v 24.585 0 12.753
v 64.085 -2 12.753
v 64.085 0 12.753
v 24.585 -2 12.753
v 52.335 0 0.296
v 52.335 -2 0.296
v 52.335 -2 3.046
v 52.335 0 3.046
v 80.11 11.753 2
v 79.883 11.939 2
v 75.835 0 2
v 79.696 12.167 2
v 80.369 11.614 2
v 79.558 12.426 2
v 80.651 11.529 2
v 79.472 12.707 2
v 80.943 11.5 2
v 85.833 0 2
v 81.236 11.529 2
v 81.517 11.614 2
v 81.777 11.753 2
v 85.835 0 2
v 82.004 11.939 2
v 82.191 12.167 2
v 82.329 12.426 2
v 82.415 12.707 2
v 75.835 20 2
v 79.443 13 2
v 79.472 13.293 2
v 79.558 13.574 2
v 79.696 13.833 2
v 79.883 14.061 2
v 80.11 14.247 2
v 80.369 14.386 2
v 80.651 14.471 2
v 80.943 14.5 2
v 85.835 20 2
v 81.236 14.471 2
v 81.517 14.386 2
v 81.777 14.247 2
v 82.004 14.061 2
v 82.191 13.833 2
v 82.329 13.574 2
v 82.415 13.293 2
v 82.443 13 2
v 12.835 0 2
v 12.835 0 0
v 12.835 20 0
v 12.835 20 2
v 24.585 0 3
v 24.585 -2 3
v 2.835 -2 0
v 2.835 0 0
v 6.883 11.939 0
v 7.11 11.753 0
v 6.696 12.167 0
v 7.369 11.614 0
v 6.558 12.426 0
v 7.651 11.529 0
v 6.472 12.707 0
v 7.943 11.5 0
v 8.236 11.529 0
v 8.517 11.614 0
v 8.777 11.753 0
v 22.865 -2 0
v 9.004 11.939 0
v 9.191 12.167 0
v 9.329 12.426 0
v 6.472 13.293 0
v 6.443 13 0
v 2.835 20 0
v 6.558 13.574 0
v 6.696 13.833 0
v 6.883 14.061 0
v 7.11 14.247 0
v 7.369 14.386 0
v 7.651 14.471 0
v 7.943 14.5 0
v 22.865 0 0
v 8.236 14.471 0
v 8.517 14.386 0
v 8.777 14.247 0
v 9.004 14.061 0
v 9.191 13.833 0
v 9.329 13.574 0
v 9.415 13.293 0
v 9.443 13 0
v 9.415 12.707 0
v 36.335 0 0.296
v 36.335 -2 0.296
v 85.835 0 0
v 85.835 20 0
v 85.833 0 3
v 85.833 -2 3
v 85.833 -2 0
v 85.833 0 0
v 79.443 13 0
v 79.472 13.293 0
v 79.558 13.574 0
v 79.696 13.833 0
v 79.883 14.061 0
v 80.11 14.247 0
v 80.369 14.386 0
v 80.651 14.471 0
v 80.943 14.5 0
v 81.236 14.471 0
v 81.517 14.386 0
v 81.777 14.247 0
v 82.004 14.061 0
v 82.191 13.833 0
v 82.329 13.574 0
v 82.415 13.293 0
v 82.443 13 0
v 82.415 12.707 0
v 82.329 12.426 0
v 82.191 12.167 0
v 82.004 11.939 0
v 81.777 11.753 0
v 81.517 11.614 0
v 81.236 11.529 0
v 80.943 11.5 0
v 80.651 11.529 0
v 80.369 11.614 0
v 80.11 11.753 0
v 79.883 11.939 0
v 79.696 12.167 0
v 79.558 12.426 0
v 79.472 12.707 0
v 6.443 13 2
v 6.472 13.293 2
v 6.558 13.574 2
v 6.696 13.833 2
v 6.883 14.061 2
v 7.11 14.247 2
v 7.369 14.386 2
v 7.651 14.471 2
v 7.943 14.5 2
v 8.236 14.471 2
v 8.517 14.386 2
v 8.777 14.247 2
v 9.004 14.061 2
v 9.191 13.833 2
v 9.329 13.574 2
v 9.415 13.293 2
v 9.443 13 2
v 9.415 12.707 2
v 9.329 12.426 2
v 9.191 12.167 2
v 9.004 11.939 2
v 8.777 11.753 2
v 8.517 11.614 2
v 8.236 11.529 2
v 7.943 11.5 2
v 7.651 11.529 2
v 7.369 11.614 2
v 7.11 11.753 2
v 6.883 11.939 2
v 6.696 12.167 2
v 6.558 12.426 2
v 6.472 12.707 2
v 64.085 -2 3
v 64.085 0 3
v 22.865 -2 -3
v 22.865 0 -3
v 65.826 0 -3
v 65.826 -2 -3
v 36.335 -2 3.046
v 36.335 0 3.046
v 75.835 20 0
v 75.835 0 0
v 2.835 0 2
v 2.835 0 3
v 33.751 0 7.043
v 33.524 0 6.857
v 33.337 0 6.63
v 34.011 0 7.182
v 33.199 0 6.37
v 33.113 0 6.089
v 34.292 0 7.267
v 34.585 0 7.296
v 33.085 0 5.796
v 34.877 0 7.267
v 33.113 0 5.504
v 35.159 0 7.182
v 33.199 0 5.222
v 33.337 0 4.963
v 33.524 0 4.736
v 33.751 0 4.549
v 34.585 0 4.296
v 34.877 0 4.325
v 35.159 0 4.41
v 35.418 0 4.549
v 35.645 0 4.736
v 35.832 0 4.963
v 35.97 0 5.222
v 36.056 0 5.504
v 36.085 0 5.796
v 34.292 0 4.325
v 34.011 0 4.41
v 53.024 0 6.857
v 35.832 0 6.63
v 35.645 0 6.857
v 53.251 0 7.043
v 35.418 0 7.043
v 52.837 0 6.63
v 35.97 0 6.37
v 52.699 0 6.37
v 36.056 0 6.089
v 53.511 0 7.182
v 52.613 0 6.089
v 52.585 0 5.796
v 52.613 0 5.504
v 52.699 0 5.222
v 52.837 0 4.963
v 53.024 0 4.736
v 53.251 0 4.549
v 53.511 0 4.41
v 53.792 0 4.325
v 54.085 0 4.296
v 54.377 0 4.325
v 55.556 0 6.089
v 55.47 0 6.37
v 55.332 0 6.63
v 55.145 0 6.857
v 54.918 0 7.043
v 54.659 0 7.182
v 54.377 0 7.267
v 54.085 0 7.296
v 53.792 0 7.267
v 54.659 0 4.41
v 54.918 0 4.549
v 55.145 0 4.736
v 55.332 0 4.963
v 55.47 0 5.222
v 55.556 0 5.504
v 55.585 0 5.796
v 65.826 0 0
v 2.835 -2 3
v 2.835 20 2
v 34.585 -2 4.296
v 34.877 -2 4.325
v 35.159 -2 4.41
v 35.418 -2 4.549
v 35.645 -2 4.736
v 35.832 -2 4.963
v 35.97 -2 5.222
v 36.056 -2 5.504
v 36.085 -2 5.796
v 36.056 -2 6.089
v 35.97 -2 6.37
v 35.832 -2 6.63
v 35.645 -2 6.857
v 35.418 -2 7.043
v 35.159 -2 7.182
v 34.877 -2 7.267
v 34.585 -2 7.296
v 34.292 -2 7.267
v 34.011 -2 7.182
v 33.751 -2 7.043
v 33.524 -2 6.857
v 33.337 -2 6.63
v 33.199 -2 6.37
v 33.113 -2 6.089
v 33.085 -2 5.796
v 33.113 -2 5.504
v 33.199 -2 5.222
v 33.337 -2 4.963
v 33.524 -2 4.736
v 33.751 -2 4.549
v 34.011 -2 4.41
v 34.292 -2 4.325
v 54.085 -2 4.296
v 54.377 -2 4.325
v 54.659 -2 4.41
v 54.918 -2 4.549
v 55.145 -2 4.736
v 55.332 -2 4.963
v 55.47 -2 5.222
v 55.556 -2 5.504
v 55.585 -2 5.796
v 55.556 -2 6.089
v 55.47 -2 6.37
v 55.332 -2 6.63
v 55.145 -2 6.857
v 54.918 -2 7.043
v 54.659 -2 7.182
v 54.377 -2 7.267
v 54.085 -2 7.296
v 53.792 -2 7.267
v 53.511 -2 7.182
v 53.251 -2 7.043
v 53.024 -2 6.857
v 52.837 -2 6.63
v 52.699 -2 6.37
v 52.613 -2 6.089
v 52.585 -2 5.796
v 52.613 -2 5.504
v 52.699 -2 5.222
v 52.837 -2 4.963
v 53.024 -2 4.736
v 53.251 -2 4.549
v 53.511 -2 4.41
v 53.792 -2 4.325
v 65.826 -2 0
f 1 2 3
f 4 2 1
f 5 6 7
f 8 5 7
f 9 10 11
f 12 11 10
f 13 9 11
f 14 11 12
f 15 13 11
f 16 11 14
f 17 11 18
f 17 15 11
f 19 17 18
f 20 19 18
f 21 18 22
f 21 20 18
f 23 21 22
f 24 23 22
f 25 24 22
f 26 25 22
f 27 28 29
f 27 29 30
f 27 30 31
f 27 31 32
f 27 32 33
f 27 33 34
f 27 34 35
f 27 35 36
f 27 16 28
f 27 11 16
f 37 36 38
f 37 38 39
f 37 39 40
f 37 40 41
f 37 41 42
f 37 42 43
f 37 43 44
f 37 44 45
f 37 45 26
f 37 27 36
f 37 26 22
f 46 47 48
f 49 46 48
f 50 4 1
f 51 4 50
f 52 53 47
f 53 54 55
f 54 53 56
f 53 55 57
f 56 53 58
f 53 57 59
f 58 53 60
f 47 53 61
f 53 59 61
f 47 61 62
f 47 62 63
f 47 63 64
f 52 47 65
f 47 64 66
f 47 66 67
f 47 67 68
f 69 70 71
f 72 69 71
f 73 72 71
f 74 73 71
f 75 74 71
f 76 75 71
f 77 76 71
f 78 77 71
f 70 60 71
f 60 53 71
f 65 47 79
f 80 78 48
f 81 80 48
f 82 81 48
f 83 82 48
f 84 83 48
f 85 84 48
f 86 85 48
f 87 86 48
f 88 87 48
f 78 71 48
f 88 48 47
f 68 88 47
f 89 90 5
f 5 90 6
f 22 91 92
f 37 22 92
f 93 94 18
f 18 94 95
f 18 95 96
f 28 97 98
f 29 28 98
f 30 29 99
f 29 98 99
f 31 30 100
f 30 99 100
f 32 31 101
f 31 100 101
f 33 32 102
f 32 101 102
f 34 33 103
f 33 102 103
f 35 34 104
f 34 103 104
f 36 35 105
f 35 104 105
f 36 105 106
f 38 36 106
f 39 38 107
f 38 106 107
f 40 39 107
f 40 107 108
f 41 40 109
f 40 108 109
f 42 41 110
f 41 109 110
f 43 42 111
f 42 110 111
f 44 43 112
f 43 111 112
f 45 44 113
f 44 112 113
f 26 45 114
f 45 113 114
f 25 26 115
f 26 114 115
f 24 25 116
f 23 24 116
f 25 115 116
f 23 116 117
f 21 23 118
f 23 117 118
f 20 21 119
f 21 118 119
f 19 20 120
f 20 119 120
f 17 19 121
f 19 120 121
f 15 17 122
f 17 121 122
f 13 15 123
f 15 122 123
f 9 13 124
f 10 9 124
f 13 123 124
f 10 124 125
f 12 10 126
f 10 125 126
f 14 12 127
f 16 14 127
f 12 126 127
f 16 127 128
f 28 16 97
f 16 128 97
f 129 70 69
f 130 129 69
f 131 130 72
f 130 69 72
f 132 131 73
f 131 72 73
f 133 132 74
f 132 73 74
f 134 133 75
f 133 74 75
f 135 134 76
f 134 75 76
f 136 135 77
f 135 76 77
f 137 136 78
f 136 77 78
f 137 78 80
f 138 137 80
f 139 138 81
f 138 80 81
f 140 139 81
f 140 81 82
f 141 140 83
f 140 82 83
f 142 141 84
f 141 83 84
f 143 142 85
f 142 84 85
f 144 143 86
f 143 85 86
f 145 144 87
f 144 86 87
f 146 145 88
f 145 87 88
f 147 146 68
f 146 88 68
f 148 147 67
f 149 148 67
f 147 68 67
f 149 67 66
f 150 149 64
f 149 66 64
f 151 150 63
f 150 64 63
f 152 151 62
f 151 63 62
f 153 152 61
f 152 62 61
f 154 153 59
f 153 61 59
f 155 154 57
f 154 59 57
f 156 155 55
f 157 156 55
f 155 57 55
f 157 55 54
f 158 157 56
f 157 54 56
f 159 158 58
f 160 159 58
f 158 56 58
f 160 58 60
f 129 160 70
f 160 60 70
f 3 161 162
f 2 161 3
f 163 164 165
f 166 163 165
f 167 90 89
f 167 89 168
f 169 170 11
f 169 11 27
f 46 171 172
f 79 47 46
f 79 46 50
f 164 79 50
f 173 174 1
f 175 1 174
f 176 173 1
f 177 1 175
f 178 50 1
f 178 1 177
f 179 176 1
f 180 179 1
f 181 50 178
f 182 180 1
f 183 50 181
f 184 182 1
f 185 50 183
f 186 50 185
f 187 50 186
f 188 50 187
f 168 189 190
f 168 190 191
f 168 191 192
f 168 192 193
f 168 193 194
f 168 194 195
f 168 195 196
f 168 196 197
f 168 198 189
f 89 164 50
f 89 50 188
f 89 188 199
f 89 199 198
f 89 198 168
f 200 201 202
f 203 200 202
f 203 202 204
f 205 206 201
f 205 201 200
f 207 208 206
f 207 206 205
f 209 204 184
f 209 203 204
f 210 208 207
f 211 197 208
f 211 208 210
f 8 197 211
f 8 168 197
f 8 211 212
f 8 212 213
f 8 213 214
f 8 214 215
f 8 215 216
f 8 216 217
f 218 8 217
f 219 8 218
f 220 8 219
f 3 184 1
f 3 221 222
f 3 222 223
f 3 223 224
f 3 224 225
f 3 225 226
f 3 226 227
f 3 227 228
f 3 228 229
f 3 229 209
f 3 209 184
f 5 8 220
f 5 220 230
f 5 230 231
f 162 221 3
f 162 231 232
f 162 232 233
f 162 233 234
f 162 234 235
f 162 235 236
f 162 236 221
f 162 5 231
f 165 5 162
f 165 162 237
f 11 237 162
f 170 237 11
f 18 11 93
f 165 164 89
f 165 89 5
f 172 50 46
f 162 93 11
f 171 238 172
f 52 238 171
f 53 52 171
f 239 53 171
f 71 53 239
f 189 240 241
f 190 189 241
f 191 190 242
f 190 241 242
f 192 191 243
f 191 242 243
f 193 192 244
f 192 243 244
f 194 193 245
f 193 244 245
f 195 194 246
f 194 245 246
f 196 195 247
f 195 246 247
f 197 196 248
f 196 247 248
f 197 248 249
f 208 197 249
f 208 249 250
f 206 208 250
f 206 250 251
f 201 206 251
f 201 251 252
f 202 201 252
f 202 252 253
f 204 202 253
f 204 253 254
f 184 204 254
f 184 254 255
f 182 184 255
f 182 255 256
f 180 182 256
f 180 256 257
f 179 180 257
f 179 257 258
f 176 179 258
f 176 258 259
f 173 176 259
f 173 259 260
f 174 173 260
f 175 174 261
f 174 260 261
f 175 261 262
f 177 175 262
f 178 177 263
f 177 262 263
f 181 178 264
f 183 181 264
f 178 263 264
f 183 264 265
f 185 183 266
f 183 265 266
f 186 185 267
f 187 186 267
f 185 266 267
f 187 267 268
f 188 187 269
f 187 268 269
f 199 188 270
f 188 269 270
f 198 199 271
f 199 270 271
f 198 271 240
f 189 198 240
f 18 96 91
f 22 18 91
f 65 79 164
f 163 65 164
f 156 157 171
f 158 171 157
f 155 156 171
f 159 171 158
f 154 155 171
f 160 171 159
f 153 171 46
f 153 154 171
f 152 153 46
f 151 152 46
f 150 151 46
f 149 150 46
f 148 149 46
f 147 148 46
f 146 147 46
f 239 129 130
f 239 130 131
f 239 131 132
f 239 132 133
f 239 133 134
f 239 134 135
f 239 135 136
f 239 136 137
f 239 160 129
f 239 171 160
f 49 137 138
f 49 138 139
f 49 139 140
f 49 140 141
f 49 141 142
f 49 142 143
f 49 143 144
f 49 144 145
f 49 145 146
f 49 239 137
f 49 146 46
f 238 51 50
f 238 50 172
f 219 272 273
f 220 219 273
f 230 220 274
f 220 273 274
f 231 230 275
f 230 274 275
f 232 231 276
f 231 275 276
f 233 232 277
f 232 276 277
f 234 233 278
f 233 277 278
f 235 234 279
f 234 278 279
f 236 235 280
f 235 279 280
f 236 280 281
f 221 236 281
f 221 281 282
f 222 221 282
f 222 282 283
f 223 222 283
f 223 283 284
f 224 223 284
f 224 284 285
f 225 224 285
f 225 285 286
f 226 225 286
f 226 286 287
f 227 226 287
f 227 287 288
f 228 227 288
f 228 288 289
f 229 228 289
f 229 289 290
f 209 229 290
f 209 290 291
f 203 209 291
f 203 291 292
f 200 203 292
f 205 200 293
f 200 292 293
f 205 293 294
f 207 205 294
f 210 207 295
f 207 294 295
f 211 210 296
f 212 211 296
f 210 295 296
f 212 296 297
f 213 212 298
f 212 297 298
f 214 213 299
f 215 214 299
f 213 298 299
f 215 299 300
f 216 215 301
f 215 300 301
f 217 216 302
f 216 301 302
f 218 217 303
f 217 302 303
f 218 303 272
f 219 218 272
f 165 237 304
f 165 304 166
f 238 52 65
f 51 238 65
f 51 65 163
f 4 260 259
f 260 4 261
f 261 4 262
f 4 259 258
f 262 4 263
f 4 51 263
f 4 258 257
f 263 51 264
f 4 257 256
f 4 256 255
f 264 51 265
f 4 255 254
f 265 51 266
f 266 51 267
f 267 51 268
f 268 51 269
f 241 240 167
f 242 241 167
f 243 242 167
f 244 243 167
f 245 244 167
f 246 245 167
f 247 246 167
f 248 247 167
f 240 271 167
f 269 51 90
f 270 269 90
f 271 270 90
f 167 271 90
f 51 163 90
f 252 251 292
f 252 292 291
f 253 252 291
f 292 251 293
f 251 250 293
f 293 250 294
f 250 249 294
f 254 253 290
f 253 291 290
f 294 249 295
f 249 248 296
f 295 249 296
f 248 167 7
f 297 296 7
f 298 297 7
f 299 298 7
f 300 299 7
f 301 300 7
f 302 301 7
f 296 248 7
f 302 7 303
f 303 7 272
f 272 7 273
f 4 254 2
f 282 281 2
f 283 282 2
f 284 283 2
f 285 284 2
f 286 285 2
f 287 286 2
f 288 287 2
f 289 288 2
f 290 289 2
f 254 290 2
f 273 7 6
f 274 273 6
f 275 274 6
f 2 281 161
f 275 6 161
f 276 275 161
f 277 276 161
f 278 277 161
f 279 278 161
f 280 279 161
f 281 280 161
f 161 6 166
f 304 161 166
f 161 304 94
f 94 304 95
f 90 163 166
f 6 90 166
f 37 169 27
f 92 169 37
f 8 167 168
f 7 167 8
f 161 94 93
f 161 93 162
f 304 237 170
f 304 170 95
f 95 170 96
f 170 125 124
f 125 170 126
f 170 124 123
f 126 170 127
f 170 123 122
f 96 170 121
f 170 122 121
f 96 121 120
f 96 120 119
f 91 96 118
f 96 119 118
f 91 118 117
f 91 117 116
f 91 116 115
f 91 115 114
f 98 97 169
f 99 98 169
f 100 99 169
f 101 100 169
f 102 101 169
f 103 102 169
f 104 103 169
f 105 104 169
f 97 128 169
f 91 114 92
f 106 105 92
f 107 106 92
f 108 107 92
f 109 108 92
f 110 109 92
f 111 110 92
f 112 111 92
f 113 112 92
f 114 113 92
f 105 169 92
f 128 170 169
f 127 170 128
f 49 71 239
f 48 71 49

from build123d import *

# Parameters (mm, degrees)
SKETCH2_W                = 10
SKETCH2_H                = 20
BOSS_EXTRUDE1_DEPTH      = 2
BOSS_EXTRUDE1_2_DEPTH    = 2
SKETCH6_R                = 1.5
CUT_EXTRUDE1_DEPTH       = 2
BOSS_EXTRUDE2_DEPTH      = 15
BOSS_EXTRUDE2_DEPTH_BACK = 5
SKETCH7_W                = 82.998753655
SKETCH7_H                = 2
SKETCH8_R                = 1.5
SKETCH8_W                = 16
SKETCH8_H                = 2.75
CUT_EXTRUDE2_DEPTH       = 15
SKETCH9_W                = 20.030400643
SKETCH9_H                = 3
SKETCH9_W_2              = 20.007179251
CUT_EXTRUDE3_DEPTH       = 15


with BuildPart() as part:
    # Sketch2 → Boss-Extrude1 (new body)
    with BuildSketch(Plane.XY):
        with Locations((7.834645669, 10)):
            Rectangle(SKETCH2_W, SKETCH2_H)
    extrude(amount=BOSS_EXTRUDE1_DEPTH)


with BuildPart() as body_2:
    # Sketch2 → Boss-Extrude1 2 (new body)
    with BuildSketch(Plane.XY):
        with Locations((80.834645669, 10)):
            Rectangle(SKETCH2_W, SKETCH2_H)
    extrude(amount=BOSS_EXTRUDE1_2_DEPTH)


with BuildPart() as cut_extrude1_tool:
    # Sketch6 → Cut-Extrude1 (new body)
    with BuildSketch(Plane(origin=(0, 0, 0), x_dir=(-1, 0, 0), z_dir=(0, 0, -1))):
        with Locations((-80.943458849, 13)):
            Circle(SKETCH6_R)
        with Locations((-7.943458849, 13)):
            Circle(SKETCH6_R)
    extrude(amount=-CUT_EXTRUDE1_DEPTH)


with BuildPart() as part_1:
    add(part.part)

    # Cut-Extrude1: cut by cut_extrude1_tool
    add(cut_extrude1_tool.part, mode=Mode.SUBTRACT)



with BuildPart() as body_2_1:
    add(body_2.part)

    # Cut-Extrude1: cut by cut_extrude1_tool
    add(cut_extrude1_tool.part, mode=Mode.SUBTRACT)


with BuildPart() as part_2:
    add(part_1.part)

    add(body_2_1.part)  # Boss-Extrude2 merges body 2
    # Sketch7 → Boss-Extrude2 (add, two sides: drawn at the far end of the back side and taken through both)
    with BuildSketch(Plane.XY.offset(2).offset(-BOSS_EXTRUDE2_DEPTH_BACK)):
        with Locations((44.334022496, -1)):
            Rectangle(SKETCH7_W, SKETCH7_H)
    extrude(amount=BOSS_EXTRUDE2_DEPTH + BOSS_EXTRUDE2_DEPTH_BACK)

    # Sketch8 → Cut-Extrude2 (cut)
    with BuildSketch(Plane.XZ.offset(2)):
        with Locations(Location((54.084645669, 5.796272293, 0), (0, 0, 270))):
            Circle(SKETCH8_R)
        with Locations(Location((34.584645669, 5.796272293, 0), (0, 0, 270))):
            Circle(SKETCH8_R)
        with Locations((44.334645669, 1.671272293)):
            Rectangle(SKETCH8_W, SKETCH8_H)
        Polygon((24.584645669, 12.752716477), (24.584645669, 3), (2.834645669, 3), (2.834645669, 17), (85.833399324, 17), (85.833399324, 3), (64.084645669, 3), (64.084645669, 12.752716477), align=None)
    extrude(amount=-CUT_EXTRUDE2_DEPTH, mode=Mode.SUBTRACT)

    # Sketch9 → Cut-Extrude3 (cut)
    with BuildSketch(Plane(origin=(0, 0, 0), x_dir=(1, 0, 0), z_dir=(0, 1, 0))):
        with Locations((12.849845991, 1.5)):
            Rectangle(SKETCH9_W, SKETCH9_H)
        with Locations((75.829809699, 1.5)):
            Rectangle(SKETCH9_W_2, SKETCH9_H)
    extrude(amount=-CUT_EXTRUDE3_DEPTH, mode=Mode.SUBTRACT)


solid = part_2.part
